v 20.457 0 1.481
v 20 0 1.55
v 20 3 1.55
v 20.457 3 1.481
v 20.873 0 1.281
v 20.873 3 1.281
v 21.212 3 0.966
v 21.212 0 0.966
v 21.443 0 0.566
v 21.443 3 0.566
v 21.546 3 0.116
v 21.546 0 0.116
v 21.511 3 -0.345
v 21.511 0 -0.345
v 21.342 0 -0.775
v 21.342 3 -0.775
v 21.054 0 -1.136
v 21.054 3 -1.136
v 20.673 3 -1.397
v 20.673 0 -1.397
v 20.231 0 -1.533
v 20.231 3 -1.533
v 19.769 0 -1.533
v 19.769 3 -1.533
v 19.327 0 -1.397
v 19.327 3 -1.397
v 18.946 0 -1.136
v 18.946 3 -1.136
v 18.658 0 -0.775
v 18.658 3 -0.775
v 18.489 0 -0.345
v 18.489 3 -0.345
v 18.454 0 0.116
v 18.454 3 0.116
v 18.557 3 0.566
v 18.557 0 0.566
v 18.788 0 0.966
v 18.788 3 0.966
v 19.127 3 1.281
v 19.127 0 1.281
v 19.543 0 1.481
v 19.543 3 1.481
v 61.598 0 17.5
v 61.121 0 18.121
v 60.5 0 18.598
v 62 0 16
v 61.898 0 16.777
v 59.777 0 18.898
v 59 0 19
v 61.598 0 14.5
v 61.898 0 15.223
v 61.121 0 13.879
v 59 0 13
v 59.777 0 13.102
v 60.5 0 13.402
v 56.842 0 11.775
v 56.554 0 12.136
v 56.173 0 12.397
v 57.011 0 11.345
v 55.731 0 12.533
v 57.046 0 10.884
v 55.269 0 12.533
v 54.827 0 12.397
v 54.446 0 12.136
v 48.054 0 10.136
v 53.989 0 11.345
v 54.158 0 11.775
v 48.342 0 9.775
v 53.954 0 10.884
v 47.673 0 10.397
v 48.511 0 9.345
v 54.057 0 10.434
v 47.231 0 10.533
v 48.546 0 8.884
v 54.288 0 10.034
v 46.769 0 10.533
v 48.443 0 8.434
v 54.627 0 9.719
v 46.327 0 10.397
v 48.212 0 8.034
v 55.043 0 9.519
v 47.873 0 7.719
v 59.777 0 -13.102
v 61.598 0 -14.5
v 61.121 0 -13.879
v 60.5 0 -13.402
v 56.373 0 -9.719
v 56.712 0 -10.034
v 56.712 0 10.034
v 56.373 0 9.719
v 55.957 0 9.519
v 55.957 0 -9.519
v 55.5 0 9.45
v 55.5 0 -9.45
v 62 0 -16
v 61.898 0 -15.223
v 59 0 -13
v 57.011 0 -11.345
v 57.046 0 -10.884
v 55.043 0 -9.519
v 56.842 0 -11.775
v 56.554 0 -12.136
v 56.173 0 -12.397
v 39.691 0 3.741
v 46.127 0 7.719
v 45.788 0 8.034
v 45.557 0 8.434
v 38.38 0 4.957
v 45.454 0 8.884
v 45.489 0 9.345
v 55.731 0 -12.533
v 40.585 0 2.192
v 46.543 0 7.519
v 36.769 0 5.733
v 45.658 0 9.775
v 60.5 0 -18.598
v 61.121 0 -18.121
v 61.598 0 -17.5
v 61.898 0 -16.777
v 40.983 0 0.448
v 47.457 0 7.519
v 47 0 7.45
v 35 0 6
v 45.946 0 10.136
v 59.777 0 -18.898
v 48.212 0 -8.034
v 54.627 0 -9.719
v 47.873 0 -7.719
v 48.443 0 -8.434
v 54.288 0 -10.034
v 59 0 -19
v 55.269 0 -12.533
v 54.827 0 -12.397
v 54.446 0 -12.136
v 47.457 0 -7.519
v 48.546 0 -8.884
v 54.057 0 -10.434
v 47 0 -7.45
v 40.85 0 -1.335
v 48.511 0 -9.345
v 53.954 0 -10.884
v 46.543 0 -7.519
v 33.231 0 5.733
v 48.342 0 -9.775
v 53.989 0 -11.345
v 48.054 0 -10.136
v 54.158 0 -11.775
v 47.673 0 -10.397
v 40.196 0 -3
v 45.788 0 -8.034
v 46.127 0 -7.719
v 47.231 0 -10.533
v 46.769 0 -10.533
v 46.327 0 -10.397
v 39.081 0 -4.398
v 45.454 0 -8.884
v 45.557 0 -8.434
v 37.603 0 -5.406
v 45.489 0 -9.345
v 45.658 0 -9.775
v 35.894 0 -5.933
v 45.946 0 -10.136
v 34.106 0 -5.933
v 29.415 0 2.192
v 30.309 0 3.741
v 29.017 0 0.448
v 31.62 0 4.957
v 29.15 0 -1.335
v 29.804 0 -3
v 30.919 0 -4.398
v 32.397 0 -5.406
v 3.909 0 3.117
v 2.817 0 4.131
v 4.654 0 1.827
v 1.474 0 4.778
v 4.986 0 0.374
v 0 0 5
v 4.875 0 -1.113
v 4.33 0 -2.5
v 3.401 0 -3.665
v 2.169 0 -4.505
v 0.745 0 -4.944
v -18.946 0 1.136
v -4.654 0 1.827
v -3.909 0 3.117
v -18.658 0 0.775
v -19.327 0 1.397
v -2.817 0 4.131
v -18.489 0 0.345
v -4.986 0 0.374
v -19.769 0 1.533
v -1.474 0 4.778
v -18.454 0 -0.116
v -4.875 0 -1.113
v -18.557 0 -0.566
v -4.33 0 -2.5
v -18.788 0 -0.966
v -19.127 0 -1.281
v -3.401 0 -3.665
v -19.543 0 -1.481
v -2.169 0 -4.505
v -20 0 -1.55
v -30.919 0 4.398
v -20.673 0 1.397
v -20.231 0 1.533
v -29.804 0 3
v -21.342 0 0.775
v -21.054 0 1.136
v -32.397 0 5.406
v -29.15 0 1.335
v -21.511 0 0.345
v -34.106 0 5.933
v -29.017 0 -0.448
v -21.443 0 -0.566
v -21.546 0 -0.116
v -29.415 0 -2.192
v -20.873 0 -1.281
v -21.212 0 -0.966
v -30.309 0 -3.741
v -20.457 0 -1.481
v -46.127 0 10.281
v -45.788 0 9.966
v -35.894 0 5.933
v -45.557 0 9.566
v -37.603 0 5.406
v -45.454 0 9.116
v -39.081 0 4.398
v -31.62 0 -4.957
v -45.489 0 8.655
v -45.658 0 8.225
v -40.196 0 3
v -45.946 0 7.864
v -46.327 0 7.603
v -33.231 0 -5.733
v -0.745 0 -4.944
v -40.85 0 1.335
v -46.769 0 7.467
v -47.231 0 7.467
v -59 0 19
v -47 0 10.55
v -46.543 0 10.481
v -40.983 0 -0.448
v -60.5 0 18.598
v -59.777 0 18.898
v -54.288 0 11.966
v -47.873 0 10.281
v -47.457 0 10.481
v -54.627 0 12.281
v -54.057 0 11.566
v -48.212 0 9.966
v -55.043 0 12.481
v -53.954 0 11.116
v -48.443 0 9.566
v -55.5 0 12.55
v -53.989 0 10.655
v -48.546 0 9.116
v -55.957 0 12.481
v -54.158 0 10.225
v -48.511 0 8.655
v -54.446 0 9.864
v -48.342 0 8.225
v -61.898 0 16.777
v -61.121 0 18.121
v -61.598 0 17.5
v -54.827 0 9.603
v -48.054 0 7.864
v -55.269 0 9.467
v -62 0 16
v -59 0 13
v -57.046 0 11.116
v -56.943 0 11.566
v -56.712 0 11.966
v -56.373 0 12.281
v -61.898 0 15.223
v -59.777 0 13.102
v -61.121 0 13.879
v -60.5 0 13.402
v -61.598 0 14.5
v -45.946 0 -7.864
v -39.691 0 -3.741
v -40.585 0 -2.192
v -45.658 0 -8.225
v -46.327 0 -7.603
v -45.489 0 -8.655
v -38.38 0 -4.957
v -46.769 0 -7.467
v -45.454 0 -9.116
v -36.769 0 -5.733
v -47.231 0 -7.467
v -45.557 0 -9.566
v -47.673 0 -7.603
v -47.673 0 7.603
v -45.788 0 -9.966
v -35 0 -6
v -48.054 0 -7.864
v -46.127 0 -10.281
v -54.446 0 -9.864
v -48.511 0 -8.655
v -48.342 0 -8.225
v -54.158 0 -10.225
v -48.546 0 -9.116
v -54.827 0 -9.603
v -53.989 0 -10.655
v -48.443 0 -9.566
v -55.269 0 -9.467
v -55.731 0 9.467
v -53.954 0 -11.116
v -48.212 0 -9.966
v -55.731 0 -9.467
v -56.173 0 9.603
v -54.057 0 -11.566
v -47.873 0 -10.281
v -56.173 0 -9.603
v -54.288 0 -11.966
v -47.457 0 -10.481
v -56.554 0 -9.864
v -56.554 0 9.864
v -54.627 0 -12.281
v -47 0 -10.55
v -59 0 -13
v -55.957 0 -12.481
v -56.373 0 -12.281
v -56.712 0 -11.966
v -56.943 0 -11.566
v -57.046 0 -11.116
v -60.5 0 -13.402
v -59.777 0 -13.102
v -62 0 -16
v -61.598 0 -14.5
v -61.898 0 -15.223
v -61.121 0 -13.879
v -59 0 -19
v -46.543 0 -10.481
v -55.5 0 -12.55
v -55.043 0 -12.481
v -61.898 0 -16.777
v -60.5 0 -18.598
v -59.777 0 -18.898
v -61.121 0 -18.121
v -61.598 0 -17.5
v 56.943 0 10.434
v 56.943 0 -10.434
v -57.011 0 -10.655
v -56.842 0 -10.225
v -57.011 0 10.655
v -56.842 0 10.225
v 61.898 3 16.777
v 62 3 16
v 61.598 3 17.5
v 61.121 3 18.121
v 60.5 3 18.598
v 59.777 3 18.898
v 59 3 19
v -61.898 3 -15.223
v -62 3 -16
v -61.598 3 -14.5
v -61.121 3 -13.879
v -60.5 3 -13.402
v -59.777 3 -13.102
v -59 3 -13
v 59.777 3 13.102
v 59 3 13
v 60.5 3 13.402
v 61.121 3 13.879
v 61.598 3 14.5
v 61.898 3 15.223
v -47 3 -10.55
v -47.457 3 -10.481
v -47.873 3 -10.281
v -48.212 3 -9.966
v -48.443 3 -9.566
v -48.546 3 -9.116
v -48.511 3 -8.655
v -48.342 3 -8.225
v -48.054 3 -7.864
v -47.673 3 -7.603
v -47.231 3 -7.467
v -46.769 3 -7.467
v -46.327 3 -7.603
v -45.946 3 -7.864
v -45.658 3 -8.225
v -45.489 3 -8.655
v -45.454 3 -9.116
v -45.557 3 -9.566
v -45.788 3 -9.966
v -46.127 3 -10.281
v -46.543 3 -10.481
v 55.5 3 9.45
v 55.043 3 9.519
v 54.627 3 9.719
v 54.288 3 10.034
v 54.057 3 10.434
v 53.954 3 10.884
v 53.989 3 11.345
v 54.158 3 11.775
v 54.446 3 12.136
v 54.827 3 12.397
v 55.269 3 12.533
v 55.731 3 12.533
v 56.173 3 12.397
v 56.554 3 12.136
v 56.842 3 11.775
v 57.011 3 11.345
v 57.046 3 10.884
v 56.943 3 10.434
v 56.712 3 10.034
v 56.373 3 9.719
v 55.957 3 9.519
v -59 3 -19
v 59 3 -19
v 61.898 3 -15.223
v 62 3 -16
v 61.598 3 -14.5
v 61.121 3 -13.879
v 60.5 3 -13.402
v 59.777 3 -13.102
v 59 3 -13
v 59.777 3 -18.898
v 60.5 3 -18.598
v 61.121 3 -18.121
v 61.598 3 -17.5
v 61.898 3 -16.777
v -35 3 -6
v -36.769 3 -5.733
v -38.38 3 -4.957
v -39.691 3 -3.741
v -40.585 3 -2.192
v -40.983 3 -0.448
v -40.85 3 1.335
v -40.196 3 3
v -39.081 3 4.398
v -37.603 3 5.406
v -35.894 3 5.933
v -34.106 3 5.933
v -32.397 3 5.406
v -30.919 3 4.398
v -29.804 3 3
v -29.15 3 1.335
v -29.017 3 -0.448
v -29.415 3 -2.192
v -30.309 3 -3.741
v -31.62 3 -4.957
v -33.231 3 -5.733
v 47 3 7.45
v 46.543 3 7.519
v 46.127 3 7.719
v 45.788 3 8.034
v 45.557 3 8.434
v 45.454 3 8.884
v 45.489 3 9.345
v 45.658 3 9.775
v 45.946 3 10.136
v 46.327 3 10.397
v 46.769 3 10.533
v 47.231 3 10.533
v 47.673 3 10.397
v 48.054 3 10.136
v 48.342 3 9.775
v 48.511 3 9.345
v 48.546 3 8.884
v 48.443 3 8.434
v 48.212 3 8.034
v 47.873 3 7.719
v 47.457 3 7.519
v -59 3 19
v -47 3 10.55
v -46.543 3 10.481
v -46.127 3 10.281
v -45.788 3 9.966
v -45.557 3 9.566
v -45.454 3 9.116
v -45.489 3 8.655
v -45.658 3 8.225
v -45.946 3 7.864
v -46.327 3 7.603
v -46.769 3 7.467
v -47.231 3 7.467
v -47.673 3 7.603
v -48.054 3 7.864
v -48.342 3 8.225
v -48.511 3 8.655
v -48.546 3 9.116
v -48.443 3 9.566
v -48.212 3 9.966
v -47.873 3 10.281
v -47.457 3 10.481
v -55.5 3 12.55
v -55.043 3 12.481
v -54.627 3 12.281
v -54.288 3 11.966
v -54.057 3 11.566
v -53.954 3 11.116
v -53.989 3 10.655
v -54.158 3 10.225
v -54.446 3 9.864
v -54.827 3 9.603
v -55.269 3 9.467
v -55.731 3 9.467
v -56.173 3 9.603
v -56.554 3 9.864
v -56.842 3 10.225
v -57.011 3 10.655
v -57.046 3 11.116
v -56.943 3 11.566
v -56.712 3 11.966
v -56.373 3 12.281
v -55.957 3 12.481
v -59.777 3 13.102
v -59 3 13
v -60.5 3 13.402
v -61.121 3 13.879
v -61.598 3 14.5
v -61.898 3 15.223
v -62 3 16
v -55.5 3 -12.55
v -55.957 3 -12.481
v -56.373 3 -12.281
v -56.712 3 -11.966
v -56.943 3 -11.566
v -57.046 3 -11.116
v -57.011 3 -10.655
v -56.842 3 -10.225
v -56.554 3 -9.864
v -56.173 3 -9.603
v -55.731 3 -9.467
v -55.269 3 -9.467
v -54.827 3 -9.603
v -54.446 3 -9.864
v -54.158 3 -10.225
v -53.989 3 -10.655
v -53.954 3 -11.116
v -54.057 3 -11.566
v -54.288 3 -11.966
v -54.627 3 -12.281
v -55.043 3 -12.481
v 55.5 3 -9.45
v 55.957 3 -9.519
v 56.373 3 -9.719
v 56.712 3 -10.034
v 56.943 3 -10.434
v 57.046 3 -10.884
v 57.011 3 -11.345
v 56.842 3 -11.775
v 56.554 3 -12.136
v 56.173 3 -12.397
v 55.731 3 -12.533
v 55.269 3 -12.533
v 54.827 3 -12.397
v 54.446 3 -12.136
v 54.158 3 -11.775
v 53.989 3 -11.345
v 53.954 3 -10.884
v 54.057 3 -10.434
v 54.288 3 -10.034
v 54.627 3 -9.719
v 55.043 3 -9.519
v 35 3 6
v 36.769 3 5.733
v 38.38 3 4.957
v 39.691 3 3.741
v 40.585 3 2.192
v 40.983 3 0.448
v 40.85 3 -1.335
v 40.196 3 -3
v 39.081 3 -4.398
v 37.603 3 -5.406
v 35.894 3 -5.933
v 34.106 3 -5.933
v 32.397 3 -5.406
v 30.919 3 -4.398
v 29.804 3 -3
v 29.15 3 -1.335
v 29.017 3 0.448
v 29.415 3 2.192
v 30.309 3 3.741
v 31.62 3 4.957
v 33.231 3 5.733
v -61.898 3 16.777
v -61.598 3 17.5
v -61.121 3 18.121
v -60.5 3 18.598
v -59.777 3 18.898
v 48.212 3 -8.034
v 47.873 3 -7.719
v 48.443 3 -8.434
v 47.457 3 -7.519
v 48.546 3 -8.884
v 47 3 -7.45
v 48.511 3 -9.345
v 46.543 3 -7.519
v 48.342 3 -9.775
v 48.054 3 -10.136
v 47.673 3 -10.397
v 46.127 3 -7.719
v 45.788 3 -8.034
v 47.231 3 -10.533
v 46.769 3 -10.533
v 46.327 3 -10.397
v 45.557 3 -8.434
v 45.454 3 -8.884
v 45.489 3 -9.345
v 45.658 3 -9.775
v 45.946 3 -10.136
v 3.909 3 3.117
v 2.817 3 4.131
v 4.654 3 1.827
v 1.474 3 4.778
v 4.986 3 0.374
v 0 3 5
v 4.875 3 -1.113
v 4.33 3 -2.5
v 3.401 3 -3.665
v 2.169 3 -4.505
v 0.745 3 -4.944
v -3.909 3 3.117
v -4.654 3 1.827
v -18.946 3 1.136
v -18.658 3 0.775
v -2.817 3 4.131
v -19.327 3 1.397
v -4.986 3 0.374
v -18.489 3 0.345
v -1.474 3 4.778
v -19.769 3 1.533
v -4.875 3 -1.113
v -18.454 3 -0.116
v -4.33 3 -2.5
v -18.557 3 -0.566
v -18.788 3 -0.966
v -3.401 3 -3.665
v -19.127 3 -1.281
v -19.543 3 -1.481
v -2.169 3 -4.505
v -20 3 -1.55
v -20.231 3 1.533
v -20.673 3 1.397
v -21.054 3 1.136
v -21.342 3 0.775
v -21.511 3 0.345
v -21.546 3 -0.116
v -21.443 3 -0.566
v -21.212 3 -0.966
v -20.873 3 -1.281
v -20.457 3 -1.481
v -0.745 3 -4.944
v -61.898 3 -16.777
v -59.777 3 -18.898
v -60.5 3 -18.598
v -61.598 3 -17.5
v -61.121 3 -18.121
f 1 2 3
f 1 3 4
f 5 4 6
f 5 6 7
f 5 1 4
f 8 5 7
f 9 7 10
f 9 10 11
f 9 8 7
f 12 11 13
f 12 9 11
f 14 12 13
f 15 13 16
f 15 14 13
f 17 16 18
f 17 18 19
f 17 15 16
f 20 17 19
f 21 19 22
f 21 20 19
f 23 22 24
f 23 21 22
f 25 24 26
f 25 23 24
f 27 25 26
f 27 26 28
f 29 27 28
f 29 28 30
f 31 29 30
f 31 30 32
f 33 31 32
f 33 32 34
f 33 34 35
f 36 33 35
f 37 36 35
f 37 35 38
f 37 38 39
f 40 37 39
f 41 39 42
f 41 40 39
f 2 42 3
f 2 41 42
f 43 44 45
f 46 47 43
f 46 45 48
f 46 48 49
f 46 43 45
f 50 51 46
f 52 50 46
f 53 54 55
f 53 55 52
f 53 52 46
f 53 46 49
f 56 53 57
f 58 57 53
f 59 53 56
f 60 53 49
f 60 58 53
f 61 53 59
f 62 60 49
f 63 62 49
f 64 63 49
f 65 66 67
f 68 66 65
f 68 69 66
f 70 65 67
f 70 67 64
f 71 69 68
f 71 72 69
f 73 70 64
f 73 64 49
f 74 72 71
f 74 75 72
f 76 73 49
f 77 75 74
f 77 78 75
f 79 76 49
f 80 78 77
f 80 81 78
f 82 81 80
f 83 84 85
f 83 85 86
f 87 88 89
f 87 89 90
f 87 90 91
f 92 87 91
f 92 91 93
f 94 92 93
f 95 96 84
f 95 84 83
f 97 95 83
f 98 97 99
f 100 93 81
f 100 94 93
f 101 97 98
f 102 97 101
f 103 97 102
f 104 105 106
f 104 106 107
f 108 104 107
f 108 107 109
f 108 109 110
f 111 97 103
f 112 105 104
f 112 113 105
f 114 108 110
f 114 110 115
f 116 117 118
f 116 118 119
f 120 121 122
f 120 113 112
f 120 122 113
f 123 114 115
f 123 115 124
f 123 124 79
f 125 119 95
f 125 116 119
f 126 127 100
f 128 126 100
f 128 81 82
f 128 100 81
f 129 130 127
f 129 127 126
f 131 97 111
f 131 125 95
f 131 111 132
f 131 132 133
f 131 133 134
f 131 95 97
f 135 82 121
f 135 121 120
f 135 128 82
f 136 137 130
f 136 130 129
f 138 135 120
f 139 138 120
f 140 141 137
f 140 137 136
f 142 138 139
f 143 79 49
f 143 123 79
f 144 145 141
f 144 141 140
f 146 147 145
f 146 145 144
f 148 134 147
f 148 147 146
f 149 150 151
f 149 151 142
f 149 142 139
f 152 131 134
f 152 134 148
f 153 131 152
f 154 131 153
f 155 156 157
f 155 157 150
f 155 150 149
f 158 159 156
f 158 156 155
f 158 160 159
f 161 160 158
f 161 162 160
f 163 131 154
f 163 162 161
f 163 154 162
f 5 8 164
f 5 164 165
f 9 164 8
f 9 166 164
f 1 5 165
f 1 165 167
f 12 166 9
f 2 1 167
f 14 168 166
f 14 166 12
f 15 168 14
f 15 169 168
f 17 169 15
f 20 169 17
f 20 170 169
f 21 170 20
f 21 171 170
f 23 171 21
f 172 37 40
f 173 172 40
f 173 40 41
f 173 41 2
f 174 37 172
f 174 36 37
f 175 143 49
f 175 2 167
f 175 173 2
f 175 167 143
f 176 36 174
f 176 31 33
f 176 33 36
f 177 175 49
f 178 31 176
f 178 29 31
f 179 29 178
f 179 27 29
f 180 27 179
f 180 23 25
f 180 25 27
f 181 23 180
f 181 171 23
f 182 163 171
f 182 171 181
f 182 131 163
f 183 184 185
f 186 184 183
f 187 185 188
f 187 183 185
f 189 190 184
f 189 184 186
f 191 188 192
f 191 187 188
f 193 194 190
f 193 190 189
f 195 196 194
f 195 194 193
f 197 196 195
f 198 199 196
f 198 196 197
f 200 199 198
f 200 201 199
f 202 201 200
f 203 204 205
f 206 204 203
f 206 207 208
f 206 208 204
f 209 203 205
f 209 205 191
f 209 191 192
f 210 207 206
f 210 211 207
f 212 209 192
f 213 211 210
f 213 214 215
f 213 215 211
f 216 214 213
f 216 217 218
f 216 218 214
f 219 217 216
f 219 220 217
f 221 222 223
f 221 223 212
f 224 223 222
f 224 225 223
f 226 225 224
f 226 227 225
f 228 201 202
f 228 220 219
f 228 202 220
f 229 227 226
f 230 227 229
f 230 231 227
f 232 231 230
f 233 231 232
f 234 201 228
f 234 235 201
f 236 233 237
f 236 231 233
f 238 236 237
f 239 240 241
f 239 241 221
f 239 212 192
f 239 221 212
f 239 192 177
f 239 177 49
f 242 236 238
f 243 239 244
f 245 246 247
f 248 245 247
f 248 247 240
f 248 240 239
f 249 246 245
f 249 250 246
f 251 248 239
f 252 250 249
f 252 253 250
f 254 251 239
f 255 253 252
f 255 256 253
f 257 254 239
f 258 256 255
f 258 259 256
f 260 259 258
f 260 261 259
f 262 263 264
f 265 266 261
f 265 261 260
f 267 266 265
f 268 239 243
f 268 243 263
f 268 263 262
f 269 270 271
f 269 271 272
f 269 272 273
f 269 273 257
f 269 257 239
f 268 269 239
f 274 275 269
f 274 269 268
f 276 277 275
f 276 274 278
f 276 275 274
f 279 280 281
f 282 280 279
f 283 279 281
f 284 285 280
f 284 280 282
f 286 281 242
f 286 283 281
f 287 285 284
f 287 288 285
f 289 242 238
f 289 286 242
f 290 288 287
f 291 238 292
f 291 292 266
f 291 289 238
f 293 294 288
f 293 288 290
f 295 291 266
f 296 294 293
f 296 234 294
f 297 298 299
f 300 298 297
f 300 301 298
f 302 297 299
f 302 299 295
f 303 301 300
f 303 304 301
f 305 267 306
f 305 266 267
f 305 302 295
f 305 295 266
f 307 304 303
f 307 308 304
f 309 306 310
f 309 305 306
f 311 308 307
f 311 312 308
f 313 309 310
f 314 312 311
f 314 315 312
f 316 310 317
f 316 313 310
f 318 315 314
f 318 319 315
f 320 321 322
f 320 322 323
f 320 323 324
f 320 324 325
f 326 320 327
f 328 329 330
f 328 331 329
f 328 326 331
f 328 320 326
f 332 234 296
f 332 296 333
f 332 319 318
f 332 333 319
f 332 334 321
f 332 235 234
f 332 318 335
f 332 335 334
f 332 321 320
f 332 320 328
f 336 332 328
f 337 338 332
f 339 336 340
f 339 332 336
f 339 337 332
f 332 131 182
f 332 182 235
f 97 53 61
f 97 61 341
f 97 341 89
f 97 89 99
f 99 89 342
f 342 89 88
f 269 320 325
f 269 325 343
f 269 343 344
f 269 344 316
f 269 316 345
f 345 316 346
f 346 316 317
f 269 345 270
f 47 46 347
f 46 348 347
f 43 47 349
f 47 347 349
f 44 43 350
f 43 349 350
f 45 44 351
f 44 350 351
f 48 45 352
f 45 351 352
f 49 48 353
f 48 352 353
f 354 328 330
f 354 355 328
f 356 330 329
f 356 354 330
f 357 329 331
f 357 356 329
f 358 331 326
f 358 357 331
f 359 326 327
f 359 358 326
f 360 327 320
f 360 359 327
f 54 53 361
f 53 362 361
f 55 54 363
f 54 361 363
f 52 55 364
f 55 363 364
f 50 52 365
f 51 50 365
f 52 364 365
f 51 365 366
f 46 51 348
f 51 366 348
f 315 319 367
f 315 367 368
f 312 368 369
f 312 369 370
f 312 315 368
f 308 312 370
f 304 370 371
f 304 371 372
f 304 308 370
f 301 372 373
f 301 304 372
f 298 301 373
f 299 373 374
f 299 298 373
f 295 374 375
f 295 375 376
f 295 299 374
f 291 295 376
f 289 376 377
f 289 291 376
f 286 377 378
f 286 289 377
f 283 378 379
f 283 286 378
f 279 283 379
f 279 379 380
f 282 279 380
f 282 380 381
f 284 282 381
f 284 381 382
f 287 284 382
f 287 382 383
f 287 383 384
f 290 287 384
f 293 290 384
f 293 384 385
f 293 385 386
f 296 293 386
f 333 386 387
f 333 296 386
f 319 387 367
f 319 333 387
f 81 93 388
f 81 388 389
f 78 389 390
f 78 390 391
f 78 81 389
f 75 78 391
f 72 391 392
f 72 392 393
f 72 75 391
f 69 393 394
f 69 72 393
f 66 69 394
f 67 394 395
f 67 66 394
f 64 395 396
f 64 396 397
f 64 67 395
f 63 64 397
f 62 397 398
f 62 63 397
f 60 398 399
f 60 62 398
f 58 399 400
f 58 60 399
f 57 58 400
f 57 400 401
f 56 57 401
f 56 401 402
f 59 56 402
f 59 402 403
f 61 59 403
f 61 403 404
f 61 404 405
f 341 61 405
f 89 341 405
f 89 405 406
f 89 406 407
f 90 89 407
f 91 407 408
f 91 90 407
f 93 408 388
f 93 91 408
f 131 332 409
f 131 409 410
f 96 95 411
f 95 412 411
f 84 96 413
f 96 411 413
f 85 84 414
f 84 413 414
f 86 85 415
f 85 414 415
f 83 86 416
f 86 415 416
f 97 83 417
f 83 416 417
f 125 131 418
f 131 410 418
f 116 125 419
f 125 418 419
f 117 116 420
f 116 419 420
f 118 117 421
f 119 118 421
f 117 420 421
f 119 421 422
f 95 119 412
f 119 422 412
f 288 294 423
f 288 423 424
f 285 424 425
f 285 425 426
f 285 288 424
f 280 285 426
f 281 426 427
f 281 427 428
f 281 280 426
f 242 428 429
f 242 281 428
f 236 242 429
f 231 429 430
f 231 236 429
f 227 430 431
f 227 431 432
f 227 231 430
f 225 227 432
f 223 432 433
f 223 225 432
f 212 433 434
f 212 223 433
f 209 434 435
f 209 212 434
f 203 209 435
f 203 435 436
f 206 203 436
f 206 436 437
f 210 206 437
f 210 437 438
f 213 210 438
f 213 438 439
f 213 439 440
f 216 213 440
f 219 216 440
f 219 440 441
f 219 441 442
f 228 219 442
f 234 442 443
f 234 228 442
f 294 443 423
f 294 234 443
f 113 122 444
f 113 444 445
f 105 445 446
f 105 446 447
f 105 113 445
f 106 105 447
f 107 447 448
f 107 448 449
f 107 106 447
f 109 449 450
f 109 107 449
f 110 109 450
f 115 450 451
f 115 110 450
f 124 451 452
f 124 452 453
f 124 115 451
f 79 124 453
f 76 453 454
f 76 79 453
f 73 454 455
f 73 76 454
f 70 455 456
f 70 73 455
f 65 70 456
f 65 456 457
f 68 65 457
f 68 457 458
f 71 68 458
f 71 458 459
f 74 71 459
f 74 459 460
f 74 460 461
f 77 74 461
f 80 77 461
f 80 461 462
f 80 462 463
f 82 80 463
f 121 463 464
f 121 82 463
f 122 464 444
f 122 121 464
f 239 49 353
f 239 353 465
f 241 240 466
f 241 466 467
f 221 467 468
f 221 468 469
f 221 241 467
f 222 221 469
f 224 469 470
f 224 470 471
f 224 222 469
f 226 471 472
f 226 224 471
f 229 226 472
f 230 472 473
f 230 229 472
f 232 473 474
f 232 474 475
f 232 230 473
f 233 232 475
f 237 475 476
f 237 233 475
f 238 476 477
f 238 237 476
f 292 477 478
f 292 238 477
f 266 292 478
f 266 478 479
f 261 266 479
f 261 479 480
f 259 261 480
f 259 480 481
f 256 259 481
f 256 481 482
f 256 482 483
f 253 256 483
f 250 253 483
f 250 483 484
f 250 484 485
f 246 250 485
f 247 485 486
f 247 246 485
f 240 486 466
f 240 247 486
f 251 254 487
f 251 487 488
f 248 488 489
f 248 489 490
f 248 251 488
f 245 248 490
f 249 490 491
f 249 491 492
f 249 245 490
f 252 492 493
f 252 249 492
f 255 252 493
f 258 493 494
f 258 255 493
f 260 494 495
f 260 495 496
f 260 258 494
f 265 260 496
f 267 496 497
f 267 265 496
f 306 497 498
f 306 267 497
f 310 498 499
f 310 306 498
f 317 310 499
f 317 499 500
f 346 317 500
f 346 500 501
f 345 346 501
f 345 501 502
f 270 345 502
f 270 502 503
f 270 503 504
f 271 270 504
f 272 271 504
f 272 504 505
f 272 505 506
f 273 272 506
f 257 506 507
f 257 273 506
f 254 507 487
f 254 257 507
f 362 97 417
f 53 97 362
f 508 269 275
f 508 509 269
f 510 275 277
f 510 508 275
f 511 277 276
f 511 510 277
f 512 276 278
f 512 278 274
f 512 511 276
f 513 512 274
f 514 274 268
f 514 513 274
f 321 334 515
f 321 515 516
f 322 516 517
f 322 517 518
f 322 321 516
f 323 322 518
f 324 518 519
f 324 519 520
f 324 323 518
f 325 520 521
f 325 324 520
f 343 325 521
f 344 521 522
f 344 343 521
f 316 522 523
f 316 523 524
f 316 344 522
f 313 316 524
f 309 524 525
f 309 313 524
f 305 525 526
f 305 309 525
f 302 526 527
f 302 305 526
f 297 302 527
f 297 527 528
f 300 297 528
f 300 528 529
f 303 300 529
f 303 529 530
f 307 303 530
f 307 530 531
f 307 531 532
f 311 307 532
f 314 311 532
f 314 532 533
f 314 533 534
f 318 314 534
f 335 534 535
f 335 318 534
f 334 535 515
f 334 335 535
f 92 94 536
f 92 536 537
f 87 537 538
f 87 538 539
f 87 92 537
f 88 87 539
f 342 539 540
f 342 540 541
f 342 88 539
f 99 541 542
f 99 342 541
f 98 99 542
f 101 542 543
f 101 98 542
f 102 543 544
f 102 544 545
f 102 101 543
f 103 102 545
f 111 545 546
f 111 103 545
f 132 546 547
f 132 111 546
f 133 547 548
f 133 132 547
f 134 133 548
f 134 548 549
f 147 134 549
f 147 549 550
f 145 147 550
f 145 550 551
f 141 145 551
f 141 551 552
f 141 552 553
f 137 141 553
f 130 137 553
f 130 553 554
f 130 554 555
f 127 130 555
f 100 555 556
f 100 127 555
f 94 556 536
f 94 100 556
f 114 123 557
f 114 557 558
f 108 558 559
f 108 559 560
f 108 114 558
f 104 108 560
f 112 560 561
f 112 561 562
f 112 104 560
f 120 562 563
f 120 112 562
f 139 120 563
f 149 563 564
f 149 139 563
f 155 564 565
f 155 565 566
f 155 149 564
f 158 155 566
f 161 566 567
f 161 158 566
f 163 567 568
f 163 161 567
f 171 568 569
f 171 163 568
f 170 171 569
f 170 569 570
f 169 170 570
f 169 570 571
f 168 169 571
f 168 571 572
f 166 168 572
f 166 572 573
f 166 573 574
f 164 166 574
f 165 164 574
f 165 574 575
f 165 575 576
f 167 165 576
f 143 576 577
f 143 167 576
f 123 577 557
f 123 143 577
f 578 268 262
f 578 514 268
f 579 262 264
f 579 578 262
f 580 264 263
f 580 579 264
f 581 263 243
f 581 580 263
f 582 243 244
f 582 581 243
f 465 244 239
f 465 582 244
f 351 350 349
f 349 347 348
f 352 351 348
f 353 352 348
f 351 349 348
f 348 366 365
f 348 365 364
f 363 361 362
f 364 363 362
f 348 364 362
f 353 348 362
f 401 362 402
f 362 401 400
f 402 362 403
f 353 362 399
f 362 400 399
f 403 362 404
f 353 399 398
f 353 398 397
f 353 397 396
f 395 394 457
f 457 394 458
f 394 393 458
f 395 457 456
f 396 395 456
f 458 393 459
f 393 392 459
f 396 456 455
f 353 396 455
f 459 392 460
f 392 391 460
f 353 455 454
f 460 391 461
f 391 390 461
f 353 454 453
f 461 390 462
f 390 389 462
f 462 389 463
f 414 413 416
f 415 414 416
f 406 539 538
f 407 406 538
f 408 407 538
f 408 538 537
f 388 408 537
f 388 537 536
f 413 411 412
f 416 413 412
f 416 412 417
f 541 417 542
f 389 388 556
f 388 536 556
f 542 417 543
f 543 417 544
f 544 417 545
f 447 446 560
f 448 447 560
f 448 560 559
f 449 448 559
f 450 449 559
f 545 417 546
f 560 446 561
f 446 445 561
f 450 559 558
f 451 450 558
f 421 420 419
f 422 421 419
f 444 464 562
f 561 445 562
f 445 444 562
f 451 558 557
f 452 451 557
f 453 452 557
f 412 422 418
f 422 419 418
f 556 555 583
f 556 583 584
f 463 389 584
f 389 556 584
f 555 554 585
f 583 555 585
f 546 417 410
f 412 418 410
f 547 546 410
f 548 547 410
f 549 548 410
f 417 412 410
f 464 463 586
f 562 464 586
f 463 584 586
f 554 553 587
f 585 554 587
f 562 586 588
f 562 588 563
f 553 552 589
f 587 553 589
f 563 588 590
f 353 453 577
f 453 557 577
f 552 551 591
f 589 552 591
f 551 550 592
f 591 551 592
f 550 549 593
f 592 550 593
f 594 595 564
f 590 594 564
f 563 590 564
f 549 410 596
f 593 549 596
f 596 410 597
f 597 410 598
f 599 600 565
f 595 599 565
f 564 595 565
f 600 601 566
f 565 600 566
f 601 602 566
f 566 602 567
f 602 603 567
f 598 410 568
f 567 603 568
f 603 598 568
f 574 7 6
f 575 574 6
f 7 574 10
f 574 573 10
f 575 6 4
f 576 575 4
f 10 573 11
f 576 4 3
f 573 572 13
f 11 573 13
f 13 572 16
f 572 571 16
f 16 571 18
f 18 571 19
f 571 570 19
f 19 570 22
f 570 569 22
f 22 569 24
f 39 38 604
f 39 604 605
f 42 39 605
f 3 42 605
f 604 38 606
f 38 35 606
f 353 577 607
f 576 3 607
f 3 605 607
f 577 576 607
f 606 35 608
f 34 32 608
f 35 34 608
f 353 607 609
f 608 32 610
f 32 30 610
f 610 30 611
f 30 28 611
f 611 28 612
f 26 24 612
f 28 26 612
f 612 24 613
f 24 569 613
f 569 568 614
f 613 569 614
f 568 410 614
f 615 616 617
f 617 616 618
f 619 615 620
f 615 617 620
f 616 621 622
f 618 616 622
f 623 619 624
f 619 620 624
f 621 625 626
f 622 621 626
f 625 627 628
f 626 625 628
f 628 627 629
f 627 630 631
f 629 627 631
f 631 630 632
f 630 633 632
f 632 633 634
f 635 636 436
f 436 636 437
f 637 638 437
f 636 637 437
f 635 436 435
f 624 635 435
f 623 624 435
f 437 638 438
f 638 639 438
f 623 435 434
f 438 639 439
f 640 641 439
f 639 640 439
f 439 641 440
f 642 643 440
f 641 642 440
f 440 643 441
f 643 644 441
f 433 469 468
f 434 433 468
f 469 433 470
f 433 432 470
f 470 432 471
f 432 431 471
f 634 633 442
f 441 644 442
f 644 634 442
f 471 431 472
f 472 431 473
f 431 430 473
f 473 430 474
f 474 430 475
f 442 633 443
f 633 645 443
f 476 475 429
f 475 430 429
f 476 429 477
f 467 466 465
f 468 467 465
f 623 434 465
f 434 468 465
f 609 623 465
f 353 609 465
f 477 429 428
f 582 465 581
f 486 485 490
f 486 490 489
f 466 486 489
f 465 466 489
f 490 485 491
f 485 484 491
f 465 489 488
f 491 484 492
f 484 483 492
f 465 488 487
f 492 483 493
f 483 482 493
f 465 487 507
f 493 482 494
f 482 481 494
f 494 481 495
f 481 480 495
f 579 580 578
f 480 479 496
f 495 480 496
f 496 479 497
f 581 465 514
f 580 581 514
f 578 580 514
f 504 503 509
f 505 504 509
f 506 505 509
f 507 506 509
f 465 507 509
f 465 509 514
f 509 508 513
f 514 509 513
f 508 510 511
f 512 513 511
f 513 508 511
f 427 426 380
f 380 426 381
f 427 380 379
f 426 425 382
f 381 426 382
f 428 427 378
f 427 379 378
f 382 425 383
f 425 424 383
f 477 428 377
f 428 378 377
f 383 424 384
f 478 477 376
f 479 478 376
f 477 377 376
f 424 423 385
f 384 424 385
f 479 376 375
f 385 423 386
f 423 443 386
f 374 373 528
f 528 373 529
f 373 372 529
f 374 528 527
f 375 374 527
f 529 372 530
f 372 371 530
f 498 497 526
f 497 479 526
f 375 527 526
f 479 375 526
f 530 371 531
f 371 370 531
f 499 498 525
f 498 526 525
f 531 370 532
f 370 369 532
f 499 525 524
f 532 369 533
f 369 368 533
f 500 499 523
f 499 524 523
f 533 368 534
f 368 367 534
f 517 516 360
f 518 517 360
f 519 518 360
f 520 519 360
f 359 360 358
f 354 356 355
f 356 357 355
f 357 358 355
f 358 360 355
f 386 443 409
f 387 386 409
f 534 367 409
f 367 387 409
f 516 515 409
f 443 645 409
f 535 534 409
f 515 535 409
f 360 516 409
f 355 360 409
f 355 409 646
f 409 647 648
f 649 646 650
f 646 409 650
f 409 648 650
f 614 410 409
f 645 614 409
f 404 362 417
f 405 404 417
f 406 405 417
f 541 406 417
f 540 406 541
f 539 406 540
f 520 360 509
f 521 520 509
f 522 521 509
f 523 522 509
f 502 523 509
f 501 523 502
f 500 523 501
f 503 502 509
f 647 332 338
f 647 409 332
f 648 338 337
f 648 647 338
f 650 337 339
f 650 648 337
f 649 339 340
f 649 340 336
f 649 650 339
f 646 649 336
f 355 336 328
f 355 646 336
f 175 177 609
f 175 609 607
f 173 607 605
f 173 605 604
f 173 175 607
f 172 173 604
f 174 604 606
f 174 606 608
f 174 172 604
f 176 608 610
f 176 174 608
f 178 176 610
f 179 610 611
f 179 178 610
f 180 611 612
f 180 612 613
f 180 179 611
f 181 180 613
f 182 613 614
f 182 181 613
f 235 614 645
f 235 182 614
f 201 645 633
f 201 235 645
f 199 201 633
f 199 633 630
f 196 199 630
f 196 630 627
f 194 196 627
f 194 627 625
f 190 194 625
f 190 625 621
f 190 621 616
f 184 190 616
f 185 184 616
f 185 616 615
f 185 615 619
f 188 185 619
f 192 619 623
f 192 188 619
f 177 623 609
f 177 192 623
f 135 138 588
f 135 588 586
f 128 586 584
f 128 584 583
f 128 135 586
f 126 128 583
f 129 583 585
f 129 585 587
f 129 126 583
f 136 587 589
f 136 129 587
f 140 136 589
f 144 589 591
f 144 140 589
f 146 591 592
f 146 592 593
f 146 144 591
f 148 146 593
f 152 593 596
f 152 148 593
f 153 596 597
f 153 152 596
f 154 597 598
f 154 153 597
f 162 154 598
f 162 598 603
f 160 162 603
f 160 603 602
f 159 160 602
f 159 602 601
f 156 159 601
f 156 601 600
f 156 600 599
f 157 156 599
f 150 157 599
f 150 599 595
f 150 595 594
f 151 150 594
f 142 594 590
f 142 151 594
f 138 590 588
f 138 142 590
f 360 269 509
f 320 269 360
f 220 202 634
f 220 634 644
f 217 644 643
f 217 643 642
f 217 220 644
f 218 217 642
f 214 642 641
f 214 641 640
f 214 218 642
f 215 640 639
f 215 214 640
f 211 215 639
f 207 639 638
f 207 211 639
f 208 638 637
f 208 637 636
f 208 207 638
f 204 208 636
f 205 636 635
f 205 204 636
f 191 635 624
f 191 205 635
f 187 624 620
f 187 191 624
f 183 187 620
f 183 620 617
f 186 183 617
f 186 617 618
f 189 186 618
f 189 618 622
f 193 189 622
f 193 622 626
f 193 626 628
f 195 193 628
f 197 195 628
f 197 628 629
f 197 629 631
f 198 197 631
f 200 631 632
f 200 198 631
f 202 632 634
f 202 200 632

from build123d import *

# Parameters (mm, degrees)
SKETCH1_R           = 1.55
SKETCH1_R_2         = 5
SKETCH1_R_3         = 6
BOSS_EXTRUDE1_DEPTH = 3
FILLET1_R           = 3


with BuildPart() as part:
    # Sketch1 → Boss-Extrude1 (new body)
    with BuildSketch(Plane(origin=(0, 0, 0), x_dir=(1, 0, 0), z_dir=(0, 1, 0))):
        Polygon((-62, 19), (62, 19), (62, 13), (59, 13), (59, -13), (62, -13), (62, -19), (-62, -19), (-62, -13), (-59, -13), (-59, 13), (-62, 13), align=None)
        with Locations(Location((55.5, 11, 0), (0, 0, 270))):
            Circle(SKETCH1_R, mode=Mode.SUBTRACT)
        with Locations(Location((-55.5, 11, 0), (0, 0, 90))):
            Circle(SKETCH1_R, mode=Mode.SUBTRACT)
        with Locations(Location((-55.5, -11, 0), (0, 0, 270))):
            Circle(SKETCH1_R, mode=Mode.SUBTRACT)
        with Locations(Location((55.5, -11, 0), (0, 0, 90))):
            Circle(SKETCH1_R, mode=Mode.SUBTRACT)
        with Locations(Location((0, 0, 0), (0, 0, 270))):
            Circle(SKETCH1_R_2, mode=Mode.SUBTRACT)
        with Locations(Location((20, 0, 0), (0, 0, 270))):
            Circle(SKETCH1_R, mode=Mode.SUBTRACT)
        with Locations(Location((-20, 0, 0), (0, 0, 90))):
            Circle(SKETCH1_R, mode=Mode.SUBTRACT)
        with Locations(Location((35, 0, 0), (0, 0, 270))):
            Circle(SKETCH1_R_3, mode=Mode.SUBTRACT)
        with Locations(Location((-35, 0, 0), (0, 0, 90))):
            Circle(SKETCH1_R_3, mode=Mode.SUBTRACT)
        with Locations(Location((47, 9, 0), (0, 0, 270))):
            Circle(SKETCH1_R, mode=Mode.SUBTRACT)
        with Locations(Location((47, -9, 0), (0, 0, 90))):
            Circle(SKETCH1_R, mode=Mode.SUBTRACT)
        with Locations(Location((-47, -9, 0), (0, 0, 270))):
            Circle(SKETCH1_R, mode=Mode.SUBTRACT)
        with Locations(Location((-47, 9, 0), (0, 0, 90))):
            Circle(SKETCH1_R, mode=Mode.SUBTRACT)
    extrude(amount=BOSS_EXTRUDE1_DEPTH)

    # Fillet1
    fillet1_edges = [part.edges().sort_by_distance(p)[0] for p in [
        (-62, 1.5, -19),
        (-62, 1.5, -13),
        (-62, 1.5, 13),
        (-62, 1.5, 19),
        (62, 1.5, 19),
        (62, 1.5, 13),
        (62, 1.5, -13),
        (62, 1.5, -19),
    ]]
    fillet(fillet1_edges, radius=FILLET1_R - 0.0001)  # a hair under: the kernel refuses the full size


solid = part.part
